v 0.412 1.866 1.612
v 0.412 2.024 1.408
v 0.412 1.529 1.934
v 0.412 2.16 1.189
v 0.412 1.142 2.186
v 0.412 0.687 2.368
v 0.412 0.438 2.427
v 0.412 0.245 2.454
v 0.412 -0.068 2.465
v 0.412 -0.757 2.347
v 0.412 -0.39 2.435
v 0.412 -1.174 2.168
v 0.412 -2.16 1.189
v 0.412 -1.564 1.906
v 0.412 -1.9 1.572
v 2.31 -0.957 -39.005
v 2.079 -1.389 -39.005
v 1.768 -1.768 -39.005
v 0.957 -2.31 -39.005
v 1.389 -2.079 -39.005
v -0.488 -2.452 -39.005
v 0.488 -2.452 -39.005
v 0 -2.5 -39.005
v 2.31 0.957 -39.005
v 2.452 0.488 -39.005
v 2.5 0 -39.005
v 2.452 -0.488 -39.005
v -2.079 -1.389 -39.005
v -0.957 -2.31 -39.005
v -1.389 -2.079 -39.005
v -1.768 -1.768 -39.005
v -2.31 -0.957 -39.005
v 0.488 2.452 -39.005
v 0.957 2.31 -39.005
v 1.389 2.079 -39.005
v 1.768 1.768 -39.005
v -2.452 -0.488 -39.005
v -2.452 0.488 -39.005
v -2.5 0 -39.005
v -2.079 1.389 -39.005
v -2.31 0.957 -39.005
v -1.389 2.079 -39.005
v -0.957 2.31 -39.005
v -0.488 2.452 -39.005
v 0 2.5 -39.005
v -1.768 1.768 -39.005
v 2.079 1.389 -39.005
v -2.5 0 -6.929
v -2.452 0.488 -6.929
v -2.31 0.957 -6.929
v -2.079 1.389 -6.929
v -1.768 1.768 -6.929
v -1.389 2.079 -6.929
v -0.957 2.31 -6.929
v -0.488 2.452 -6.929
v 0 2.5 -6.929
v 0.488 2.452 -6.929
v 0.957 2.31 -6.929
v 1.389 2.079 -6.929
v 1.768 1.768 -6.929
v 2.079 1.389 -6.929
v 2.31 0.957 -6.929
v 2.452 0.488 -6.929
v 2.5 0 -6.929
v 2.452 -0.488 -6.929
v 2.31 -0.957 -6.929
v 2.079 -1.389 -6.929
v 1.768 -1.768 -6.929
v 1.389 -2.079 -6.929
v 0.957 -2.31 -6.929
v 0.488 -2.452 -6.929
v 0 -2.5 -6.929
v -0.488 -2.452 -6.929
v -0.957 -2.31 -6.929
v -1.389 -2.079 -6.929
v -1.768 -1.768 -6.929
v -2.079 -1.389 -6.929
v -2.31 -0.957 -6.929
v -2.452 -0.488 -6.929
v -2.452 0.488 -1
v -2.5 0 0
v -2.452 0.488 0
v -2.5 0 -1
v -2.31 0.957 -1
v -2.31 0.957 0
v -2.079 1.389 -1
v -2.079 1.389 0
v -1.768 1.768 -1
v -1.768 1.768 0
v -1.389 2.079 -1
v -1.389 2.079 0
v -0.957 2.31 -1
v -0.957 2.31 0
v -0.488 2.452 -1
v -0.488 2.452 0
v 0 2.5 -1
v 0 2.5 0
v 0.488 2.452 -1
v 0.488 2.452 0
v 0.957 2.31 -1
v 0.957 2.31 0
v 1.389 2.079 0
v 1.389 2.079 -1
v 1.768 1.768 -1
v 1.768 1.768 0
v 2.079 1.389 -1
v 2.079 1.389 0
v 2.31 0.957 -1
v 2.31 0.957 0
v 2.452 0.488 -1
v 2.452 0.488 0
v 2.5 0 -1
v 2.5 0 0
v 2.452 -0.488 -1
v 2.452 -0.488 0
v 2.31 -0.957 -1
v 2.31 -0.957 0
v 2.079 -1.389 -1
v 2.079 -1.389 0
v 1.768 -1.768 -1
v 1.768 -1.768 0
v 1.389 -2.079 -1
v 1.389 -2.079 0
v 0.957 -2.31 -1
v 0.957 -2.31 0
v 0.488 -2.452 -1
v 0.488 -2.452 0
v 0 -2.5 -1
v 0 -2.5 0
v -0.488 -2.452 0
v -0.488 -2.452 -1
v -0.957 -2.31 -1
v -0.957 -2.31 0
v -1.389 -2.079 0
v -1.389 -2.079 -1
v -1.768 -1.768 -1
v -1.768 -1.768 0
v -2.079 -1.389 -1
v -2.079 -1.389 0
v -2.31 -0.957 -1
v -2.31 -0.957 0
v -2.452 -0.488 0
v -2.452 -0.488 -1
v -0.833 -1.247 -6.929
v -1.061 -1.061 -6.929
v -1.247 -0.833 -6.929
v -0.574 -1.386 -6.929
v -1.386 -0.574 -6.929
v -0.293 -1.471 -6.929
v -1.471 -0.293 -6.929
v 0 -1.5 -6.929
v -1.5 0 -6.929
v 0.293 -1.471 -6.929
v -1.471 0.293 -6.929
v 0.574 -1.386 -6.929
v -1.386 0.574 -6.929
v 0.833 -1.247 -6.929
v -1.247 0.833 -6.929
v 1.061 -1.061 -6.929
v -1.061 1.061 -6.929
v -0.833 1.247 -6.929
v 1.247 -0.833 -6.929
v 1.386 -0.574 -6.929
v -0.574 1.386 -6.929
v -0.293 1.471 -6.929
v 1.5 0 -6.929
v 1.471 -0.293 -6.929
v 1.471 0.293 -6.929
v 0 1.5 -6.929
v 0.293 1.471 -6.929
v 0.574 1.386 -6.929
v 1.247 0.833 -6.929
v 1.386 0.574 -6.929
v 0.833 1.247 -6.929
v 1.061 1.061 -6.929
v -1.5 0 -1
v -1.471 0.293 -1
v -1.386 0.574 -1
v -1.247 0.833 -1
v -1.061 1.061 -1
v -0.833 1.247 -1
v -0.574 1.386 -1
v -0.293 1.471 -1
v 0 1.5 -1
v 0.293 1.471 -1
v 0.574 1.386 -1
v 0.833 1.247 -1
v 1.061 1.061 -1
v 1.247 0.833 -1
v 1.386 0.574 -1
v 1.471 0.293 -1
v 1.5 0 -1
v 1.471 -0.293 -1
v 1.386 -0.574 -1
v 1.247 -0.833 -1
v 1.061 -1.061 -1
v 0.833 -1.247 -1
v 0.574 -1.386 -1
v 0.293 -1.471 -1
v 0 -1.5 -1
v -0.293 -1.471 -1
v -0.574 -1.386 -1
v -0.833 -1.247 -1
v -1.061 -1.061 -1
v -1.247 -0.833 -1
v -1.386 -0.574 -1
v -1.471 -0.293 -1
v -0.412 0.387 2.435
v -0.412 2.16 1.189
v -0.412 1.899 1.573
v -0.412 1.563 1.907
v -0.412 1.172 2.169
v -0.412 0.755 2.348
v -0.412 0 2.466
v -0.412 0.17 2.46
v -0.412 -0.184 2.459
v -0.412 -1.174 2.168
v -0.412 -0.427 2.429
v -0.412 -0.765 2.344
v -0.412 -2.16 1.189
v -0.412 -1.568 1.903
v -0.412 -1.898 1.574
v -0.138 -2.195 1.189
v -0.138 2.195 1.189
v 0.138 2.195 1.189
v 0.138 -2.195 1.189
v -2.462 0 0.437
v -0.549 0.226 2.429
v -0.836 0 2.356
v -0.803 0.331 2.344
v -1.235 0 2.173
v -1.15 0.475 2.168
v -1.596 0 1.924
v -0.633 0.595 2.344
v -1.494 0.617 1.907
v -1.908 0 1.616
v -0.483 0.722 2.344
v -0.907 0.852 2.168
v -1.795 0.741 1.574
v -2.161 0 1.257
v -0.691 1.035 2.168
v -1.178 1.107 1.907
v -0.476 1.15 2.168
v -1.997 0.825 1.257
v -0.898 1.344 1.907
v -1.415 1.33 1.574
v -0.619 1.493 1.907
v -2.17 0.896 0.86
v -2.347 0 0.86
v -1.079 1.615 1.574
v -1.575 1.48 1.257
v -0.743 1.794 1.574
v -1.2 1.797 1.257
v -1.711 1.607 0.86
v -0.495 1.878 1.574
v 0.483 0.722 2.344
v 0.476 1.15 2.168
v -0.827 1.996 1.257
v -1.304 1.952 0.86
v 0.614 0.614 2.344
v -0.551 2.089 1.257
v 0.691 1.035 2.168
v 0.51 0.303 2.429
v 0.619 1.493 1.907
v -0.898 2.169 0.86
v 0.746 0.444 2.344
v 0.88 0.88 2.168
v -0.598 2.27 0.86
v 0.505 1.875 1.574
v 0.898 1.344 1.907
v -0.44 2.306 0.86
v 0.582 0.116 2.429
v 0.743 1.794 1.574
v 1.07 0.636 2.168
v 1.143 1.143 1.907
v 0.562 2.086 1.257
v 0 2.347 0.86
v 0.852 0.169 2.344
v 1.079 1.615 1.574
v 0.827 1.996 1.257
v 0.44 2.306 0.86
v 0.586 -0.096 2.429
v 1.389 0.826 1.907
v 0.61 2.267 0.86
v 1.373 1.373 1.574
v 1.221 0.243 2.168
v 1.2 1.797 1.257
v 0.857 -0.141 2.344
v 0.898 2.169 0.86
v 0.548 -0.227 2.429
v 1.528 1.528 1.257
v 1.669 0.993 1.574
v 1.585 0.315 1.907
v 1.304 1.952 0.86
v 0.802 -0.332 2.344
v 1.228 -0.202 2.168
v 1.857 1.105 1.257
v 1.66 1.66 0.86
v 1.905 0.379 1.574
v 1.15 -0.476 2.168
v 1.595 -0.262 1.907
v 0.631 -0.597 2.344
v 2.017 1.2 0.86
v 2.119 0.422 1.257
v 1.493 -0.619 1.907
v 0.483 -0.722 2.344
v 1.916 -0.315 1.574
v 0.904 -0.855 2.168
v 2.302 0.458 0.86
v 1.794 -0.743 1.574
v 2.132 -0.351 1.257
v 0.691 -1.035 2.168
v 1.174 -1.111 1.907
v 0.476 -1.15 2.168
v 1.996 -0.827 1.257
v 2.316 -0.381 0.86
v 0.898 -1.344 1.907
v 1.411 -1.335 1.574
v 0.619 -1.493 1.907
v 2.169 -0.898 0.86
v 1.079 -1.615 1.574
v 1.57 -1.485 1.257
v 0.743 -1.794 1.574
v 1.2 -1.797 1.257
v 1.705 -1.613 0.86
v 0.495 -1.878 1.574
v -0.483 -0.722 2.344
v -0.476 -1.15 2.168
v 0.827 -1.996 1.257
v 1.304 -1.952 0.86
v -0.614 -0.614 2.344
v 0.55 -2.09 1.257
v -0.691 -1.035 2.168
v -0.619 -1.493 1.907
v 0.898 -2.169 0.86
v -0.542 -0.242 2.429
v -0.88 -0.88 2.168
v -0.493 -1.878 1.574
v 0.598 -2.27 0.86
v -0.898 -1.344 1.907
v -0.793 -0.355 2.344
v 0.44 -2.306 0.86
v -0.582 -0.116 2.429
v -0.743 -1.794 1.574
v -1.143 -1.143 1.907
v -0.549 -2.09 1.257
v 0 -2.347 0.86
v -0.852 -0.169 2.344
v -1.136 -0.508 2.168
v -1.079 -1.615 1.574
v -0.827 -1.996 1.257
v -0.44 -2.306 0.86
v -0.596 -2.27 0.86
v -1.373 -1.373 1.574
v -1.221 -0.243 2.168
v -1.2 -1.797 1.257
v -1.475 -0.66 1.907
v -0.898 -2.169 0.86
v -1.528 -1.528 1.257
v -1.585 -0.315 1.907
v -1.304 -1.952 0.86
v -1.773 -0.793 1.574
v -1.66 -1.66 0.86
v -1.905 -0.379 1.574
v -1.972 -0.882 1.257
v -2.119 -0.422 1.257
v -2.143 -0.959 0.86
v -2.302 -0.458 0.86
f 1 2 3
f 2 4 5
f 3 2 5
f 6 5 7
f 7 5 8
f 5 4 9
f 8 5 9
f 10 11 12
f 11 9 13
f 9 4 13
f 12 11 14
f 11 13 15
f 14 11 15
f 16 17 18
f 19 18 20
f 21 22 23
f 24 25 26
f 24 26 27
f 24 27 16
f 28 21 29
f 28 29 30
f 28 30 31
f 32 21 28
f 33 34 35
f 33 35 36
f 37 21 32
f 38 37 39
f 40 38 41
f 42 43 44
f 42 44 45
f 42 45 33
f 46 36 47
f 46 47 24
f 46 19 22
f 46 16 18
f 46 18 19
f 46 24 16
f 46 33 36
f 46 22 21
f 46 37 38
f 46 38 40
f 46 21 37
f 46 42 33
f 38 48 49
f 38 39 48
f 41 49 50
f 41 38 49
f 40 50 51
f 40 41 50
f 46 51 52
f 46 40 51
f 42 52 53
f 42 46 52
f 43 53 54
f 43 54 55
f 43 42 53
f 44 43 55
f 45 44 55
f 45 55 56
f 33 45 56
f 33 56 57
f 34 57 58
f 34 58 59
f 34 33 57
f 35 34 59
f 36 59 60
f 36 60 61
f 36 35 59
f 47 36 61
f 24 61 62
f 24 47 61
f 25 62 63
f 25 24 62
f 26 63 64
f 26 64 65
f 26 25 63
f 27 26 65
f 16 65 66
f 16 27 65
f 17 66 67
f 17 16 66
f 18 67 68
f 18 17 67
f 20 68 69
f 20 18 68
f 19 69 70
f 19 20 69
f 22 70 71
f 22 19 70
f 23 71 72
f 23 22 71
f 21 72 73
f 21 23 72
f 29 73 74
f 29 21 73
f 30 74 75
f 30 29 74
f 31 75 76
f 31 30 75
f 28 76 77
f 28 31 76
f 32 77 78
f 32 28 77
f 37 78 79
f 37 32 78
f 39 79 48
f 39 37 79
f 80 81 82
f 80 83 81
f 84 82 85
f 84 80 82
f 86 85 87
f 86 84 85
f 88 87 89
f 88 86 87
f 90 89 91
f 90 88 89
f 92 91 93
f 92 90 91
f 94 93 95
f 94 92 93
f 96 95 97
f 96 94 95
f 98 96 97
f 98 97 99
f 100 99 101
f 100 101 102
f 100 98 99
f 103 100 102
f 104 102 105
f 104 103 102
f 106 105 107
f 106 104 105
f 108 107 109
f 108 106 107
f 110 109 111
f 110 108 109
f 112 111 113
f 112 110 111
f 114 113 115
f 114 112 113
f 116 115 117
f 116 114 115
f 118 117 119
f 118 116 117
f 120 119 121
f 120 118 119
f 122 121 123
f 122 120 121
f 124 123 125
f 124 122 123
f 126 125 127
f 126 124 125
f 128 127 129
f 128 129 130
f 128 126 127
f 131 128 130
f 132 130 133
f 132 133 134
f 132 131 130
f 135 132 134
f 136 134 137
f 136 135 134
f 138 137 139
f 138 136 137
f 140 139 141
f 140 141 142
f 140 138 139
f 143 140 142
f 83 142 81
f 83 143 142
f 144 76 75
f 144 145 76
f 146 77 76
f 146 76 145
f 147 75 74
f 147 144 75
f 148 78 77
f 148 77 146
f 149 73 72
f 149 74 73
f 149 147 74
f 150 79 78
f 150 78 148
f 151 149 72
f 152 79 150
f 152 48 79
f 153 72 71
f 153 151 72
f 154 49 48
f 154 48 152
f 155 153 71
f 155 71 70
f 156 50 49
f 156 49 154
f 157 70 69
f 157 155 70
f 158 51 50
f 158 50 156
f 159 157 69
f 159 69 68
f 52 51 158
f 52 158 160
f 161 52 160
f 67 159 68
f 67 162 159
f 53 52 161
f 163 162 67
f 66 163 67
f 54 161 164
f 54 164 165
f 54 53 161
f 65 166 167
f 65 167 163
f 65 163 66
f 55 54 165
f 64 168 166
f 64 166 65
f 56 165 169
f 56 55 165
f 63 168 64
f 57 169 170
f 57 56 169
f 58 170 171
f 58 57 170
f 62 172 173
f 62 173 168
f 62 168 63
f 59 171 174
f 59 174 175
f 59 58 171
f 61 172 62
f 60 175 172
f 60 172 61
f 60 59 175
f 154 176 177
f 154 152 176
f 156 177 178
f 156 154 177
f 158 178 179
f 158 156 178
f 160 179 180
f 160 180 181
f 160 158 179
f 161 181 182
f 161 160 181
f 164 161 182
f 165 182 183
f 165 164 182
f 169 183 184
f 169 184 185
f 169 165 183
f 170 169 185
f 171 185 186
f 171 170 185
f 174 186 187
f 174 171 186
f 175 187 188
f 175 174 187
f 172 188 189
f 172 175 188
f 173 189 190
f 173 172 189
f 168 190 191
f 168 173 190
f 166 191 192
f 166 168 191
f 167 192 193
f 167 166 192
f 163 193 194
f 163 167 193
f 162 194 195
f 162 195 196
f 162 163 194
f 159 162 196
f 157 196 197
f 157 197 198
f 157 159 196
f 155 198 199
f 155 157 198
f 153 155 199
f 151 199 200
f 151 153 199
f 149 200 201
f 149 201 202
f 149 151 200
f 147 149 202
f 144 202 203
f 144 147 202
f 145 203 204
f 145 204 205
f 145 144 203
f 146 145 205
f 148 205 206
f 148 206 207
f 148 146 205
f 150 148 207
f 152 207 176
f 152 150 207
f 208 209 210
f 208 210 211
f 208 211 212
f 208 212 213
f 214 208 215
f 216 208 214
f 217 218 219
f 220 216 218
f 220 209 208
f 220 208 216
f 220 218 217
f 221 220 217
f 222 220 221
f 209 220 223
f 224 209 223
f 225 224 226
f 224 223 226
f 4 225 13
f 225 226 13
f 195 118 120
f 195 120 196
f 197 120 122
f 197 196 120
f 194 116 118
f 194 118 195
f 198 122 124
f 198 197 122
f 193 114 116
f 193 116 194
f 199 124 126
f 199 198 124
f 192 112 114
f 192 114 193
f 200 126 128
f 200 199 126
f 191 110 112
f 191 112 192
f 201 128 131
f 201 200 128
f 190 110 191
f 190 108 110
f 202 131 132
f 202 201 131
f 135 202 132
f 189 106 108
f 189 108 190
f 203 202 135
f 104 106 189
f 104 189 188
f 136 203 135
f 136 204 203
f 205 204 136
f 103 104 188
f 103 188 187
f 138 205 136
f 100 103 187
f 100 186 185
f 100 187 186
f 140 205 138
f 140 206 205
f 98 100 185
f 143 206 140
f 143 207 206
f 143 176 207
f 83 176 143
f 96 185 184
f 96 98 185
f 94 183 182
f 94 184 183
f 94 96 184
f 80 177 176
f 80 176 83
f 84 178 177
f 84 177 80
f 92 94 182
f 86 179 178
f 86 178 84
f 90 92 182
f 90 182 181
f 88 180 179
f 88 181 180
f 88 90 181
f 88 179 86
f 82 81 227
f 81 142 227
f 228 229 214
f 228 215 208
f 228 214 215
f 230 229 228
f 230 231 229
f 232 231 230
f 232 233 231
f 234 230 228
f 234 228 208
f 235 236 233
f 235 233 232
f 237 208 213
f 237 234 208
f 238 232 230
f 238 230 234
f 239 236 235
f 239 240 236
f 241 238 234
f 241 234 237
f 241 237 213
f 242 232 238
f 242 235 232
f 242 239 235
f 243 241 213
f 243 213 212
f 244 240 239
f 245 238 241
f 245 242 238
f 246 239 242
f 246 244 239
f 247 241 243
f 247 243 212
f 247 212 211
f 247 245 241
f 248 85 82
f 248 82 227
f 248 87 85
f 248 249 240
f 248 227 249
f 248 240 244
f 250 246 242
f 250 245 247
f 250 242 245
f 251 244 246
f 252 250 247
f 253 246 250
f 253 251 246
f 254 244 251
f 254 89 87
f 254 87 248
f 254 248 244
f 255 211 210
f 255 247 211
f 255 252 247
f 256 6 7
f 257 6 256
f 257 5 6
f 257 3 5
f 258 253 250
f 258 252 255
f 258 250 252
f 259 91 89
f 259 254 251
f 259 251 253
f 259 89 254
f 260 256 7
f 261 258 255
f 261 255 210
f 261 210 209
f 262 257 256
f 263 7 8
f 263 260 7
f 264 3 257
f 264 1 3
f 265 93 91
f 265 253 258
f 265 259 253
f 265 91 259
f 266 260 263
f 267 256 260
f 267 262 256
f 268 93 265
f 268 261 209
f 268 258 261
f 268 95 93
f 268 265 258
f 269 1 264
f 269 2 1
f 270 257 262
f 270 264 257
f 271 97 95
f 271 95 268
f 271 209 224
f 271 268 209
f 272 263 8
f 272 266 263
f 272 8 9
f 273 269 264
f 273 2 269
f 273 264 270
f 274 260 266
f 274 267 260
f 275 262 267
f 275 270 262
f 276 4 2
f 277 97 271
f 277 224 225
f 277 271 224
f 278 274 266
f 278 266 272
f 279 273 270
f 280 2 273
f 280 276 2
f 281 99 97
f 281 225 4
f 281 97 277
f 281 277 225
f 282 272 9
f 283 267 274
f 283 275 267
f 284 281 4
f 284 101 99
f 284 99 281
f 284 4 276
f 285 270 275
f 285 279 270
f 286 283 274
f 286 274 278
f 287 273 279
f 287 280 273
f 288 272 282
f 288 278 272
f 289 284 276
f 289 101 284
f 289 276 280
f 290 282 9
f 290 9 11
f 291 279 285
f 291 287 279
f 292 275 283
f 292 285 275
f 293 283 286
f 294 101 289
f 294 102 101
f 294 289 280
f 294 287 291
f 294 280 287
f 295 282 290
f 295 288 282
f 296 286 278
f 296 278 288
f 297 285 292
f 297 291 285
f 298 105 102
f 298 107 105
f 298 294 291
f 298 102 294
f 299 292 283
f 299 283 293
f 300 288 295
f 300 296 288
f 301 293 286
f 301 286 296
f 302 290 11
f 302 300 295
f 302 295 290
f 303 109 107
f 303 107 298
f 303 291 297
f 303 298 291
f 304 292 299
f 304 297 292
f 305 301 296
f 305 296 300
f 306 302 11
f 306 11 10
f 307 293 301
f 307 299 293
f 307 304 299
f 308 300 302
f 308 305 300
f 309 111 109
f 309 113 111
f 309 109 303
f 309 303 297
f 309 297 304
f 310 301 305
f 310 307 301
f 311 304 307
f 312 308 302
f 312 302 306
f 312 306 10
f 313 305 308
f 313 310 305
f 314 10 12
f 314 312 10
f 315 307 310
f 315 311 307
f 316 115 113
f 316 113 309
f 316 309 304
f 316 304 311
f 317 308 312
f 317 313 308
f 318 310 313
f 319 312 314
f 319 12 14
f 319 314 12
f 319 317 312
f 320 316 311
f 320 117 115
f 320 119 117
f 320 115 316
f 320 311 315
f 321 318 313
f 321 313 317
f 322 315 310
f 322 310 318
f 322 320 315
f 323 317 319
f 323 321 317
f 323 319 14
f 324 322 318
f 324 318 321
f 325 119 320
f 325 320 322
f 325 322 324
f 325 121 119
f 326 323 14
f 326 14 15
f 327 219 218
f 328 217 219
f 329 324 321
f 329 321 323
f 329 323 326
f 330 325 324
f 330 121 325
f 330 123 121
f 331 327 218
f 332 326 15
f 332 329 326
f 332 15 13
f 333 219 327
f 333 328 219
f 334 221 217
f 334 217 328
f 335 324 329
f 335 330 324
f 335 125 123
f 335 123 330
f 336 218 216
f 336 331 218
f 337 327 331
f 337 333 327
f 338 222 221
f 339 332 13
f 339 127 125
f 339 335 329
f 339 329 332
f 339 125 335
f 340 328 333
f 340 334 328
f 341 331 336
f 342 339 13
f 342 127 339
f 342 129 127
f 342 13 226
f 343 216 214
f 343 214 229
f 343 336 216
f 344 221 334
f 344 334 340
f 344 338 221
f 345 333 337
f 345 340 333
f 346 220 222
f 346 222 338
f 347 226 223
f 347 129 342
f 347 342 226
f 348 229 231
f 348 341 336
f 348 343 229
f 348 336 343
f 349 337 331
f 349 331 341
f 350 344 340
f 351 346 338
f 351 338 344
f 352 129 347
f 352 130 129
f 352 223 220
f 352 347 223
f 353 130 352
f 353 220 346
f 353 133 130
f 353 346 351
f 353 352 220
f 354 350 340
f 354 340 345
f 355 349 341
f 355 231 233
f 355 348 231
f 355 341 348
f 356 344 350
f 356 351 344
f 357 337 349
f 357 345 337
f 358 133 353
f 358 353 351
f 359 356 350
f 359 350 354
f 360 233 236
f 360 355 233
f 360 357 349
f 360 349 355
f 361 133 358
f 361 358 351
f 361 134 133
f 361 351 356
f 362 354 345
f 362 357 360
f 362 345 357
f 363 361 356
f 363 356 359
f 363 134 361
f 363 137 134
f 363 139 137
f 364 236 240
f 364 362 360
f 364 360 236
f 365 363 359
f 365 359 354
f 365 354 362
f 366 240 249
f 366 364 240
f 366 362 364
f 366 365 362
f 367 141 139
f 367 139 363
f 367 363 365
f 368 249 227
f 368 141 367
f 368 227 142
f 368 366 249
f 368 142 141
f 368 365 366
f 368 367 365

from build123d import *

# Parameters (mm, degrees)
F2_W     = 0.41187
F2_H     = 2.318905
F3_DEPTH = 12.5


with BuildPart() as f1:
    # F0 (on Front) → F1 (revolve)
    with BuildSketch(Plane.XZ):
        with BuildLine():
            Line((-2.5, -1), (-1.5, -1))
            Line((-1.5, -1), (-1.5, -6.928856))
            Line((-1.5, -6.928856), (-2.5, -6.928856))
            Line((-2.5, -6.928856), (-2.5, -39.004903))
            Line((-2.5, -39.004903), (0, -39.004903))
            Line((0, -39.004903), (0, 2.5))
            ThreePointArc((0, 2.5), (-1.767767, 1.767767), (-2.5, 0))
            Line((-2.5, 0), (-2.5, -1))
        make_face()
    revolve(axis=Axis((0, 0, -18.252452), (0, 0, -1)))

    # F2 (on Front) → F3 (cut, symmetric)
    with BuildSketch(Plane.XZ):
        with Locations((-0.205935, 2.348353)):
            Rectangle(F2_W, F2_H)
        with Locations((0.205935, 2.348353)):
            Rectangle(F2_W, F2_H)
    extrude(amount=F3_DEPTH, both=True, mode=Mode.SUBTRACT)


solid = f1.part
